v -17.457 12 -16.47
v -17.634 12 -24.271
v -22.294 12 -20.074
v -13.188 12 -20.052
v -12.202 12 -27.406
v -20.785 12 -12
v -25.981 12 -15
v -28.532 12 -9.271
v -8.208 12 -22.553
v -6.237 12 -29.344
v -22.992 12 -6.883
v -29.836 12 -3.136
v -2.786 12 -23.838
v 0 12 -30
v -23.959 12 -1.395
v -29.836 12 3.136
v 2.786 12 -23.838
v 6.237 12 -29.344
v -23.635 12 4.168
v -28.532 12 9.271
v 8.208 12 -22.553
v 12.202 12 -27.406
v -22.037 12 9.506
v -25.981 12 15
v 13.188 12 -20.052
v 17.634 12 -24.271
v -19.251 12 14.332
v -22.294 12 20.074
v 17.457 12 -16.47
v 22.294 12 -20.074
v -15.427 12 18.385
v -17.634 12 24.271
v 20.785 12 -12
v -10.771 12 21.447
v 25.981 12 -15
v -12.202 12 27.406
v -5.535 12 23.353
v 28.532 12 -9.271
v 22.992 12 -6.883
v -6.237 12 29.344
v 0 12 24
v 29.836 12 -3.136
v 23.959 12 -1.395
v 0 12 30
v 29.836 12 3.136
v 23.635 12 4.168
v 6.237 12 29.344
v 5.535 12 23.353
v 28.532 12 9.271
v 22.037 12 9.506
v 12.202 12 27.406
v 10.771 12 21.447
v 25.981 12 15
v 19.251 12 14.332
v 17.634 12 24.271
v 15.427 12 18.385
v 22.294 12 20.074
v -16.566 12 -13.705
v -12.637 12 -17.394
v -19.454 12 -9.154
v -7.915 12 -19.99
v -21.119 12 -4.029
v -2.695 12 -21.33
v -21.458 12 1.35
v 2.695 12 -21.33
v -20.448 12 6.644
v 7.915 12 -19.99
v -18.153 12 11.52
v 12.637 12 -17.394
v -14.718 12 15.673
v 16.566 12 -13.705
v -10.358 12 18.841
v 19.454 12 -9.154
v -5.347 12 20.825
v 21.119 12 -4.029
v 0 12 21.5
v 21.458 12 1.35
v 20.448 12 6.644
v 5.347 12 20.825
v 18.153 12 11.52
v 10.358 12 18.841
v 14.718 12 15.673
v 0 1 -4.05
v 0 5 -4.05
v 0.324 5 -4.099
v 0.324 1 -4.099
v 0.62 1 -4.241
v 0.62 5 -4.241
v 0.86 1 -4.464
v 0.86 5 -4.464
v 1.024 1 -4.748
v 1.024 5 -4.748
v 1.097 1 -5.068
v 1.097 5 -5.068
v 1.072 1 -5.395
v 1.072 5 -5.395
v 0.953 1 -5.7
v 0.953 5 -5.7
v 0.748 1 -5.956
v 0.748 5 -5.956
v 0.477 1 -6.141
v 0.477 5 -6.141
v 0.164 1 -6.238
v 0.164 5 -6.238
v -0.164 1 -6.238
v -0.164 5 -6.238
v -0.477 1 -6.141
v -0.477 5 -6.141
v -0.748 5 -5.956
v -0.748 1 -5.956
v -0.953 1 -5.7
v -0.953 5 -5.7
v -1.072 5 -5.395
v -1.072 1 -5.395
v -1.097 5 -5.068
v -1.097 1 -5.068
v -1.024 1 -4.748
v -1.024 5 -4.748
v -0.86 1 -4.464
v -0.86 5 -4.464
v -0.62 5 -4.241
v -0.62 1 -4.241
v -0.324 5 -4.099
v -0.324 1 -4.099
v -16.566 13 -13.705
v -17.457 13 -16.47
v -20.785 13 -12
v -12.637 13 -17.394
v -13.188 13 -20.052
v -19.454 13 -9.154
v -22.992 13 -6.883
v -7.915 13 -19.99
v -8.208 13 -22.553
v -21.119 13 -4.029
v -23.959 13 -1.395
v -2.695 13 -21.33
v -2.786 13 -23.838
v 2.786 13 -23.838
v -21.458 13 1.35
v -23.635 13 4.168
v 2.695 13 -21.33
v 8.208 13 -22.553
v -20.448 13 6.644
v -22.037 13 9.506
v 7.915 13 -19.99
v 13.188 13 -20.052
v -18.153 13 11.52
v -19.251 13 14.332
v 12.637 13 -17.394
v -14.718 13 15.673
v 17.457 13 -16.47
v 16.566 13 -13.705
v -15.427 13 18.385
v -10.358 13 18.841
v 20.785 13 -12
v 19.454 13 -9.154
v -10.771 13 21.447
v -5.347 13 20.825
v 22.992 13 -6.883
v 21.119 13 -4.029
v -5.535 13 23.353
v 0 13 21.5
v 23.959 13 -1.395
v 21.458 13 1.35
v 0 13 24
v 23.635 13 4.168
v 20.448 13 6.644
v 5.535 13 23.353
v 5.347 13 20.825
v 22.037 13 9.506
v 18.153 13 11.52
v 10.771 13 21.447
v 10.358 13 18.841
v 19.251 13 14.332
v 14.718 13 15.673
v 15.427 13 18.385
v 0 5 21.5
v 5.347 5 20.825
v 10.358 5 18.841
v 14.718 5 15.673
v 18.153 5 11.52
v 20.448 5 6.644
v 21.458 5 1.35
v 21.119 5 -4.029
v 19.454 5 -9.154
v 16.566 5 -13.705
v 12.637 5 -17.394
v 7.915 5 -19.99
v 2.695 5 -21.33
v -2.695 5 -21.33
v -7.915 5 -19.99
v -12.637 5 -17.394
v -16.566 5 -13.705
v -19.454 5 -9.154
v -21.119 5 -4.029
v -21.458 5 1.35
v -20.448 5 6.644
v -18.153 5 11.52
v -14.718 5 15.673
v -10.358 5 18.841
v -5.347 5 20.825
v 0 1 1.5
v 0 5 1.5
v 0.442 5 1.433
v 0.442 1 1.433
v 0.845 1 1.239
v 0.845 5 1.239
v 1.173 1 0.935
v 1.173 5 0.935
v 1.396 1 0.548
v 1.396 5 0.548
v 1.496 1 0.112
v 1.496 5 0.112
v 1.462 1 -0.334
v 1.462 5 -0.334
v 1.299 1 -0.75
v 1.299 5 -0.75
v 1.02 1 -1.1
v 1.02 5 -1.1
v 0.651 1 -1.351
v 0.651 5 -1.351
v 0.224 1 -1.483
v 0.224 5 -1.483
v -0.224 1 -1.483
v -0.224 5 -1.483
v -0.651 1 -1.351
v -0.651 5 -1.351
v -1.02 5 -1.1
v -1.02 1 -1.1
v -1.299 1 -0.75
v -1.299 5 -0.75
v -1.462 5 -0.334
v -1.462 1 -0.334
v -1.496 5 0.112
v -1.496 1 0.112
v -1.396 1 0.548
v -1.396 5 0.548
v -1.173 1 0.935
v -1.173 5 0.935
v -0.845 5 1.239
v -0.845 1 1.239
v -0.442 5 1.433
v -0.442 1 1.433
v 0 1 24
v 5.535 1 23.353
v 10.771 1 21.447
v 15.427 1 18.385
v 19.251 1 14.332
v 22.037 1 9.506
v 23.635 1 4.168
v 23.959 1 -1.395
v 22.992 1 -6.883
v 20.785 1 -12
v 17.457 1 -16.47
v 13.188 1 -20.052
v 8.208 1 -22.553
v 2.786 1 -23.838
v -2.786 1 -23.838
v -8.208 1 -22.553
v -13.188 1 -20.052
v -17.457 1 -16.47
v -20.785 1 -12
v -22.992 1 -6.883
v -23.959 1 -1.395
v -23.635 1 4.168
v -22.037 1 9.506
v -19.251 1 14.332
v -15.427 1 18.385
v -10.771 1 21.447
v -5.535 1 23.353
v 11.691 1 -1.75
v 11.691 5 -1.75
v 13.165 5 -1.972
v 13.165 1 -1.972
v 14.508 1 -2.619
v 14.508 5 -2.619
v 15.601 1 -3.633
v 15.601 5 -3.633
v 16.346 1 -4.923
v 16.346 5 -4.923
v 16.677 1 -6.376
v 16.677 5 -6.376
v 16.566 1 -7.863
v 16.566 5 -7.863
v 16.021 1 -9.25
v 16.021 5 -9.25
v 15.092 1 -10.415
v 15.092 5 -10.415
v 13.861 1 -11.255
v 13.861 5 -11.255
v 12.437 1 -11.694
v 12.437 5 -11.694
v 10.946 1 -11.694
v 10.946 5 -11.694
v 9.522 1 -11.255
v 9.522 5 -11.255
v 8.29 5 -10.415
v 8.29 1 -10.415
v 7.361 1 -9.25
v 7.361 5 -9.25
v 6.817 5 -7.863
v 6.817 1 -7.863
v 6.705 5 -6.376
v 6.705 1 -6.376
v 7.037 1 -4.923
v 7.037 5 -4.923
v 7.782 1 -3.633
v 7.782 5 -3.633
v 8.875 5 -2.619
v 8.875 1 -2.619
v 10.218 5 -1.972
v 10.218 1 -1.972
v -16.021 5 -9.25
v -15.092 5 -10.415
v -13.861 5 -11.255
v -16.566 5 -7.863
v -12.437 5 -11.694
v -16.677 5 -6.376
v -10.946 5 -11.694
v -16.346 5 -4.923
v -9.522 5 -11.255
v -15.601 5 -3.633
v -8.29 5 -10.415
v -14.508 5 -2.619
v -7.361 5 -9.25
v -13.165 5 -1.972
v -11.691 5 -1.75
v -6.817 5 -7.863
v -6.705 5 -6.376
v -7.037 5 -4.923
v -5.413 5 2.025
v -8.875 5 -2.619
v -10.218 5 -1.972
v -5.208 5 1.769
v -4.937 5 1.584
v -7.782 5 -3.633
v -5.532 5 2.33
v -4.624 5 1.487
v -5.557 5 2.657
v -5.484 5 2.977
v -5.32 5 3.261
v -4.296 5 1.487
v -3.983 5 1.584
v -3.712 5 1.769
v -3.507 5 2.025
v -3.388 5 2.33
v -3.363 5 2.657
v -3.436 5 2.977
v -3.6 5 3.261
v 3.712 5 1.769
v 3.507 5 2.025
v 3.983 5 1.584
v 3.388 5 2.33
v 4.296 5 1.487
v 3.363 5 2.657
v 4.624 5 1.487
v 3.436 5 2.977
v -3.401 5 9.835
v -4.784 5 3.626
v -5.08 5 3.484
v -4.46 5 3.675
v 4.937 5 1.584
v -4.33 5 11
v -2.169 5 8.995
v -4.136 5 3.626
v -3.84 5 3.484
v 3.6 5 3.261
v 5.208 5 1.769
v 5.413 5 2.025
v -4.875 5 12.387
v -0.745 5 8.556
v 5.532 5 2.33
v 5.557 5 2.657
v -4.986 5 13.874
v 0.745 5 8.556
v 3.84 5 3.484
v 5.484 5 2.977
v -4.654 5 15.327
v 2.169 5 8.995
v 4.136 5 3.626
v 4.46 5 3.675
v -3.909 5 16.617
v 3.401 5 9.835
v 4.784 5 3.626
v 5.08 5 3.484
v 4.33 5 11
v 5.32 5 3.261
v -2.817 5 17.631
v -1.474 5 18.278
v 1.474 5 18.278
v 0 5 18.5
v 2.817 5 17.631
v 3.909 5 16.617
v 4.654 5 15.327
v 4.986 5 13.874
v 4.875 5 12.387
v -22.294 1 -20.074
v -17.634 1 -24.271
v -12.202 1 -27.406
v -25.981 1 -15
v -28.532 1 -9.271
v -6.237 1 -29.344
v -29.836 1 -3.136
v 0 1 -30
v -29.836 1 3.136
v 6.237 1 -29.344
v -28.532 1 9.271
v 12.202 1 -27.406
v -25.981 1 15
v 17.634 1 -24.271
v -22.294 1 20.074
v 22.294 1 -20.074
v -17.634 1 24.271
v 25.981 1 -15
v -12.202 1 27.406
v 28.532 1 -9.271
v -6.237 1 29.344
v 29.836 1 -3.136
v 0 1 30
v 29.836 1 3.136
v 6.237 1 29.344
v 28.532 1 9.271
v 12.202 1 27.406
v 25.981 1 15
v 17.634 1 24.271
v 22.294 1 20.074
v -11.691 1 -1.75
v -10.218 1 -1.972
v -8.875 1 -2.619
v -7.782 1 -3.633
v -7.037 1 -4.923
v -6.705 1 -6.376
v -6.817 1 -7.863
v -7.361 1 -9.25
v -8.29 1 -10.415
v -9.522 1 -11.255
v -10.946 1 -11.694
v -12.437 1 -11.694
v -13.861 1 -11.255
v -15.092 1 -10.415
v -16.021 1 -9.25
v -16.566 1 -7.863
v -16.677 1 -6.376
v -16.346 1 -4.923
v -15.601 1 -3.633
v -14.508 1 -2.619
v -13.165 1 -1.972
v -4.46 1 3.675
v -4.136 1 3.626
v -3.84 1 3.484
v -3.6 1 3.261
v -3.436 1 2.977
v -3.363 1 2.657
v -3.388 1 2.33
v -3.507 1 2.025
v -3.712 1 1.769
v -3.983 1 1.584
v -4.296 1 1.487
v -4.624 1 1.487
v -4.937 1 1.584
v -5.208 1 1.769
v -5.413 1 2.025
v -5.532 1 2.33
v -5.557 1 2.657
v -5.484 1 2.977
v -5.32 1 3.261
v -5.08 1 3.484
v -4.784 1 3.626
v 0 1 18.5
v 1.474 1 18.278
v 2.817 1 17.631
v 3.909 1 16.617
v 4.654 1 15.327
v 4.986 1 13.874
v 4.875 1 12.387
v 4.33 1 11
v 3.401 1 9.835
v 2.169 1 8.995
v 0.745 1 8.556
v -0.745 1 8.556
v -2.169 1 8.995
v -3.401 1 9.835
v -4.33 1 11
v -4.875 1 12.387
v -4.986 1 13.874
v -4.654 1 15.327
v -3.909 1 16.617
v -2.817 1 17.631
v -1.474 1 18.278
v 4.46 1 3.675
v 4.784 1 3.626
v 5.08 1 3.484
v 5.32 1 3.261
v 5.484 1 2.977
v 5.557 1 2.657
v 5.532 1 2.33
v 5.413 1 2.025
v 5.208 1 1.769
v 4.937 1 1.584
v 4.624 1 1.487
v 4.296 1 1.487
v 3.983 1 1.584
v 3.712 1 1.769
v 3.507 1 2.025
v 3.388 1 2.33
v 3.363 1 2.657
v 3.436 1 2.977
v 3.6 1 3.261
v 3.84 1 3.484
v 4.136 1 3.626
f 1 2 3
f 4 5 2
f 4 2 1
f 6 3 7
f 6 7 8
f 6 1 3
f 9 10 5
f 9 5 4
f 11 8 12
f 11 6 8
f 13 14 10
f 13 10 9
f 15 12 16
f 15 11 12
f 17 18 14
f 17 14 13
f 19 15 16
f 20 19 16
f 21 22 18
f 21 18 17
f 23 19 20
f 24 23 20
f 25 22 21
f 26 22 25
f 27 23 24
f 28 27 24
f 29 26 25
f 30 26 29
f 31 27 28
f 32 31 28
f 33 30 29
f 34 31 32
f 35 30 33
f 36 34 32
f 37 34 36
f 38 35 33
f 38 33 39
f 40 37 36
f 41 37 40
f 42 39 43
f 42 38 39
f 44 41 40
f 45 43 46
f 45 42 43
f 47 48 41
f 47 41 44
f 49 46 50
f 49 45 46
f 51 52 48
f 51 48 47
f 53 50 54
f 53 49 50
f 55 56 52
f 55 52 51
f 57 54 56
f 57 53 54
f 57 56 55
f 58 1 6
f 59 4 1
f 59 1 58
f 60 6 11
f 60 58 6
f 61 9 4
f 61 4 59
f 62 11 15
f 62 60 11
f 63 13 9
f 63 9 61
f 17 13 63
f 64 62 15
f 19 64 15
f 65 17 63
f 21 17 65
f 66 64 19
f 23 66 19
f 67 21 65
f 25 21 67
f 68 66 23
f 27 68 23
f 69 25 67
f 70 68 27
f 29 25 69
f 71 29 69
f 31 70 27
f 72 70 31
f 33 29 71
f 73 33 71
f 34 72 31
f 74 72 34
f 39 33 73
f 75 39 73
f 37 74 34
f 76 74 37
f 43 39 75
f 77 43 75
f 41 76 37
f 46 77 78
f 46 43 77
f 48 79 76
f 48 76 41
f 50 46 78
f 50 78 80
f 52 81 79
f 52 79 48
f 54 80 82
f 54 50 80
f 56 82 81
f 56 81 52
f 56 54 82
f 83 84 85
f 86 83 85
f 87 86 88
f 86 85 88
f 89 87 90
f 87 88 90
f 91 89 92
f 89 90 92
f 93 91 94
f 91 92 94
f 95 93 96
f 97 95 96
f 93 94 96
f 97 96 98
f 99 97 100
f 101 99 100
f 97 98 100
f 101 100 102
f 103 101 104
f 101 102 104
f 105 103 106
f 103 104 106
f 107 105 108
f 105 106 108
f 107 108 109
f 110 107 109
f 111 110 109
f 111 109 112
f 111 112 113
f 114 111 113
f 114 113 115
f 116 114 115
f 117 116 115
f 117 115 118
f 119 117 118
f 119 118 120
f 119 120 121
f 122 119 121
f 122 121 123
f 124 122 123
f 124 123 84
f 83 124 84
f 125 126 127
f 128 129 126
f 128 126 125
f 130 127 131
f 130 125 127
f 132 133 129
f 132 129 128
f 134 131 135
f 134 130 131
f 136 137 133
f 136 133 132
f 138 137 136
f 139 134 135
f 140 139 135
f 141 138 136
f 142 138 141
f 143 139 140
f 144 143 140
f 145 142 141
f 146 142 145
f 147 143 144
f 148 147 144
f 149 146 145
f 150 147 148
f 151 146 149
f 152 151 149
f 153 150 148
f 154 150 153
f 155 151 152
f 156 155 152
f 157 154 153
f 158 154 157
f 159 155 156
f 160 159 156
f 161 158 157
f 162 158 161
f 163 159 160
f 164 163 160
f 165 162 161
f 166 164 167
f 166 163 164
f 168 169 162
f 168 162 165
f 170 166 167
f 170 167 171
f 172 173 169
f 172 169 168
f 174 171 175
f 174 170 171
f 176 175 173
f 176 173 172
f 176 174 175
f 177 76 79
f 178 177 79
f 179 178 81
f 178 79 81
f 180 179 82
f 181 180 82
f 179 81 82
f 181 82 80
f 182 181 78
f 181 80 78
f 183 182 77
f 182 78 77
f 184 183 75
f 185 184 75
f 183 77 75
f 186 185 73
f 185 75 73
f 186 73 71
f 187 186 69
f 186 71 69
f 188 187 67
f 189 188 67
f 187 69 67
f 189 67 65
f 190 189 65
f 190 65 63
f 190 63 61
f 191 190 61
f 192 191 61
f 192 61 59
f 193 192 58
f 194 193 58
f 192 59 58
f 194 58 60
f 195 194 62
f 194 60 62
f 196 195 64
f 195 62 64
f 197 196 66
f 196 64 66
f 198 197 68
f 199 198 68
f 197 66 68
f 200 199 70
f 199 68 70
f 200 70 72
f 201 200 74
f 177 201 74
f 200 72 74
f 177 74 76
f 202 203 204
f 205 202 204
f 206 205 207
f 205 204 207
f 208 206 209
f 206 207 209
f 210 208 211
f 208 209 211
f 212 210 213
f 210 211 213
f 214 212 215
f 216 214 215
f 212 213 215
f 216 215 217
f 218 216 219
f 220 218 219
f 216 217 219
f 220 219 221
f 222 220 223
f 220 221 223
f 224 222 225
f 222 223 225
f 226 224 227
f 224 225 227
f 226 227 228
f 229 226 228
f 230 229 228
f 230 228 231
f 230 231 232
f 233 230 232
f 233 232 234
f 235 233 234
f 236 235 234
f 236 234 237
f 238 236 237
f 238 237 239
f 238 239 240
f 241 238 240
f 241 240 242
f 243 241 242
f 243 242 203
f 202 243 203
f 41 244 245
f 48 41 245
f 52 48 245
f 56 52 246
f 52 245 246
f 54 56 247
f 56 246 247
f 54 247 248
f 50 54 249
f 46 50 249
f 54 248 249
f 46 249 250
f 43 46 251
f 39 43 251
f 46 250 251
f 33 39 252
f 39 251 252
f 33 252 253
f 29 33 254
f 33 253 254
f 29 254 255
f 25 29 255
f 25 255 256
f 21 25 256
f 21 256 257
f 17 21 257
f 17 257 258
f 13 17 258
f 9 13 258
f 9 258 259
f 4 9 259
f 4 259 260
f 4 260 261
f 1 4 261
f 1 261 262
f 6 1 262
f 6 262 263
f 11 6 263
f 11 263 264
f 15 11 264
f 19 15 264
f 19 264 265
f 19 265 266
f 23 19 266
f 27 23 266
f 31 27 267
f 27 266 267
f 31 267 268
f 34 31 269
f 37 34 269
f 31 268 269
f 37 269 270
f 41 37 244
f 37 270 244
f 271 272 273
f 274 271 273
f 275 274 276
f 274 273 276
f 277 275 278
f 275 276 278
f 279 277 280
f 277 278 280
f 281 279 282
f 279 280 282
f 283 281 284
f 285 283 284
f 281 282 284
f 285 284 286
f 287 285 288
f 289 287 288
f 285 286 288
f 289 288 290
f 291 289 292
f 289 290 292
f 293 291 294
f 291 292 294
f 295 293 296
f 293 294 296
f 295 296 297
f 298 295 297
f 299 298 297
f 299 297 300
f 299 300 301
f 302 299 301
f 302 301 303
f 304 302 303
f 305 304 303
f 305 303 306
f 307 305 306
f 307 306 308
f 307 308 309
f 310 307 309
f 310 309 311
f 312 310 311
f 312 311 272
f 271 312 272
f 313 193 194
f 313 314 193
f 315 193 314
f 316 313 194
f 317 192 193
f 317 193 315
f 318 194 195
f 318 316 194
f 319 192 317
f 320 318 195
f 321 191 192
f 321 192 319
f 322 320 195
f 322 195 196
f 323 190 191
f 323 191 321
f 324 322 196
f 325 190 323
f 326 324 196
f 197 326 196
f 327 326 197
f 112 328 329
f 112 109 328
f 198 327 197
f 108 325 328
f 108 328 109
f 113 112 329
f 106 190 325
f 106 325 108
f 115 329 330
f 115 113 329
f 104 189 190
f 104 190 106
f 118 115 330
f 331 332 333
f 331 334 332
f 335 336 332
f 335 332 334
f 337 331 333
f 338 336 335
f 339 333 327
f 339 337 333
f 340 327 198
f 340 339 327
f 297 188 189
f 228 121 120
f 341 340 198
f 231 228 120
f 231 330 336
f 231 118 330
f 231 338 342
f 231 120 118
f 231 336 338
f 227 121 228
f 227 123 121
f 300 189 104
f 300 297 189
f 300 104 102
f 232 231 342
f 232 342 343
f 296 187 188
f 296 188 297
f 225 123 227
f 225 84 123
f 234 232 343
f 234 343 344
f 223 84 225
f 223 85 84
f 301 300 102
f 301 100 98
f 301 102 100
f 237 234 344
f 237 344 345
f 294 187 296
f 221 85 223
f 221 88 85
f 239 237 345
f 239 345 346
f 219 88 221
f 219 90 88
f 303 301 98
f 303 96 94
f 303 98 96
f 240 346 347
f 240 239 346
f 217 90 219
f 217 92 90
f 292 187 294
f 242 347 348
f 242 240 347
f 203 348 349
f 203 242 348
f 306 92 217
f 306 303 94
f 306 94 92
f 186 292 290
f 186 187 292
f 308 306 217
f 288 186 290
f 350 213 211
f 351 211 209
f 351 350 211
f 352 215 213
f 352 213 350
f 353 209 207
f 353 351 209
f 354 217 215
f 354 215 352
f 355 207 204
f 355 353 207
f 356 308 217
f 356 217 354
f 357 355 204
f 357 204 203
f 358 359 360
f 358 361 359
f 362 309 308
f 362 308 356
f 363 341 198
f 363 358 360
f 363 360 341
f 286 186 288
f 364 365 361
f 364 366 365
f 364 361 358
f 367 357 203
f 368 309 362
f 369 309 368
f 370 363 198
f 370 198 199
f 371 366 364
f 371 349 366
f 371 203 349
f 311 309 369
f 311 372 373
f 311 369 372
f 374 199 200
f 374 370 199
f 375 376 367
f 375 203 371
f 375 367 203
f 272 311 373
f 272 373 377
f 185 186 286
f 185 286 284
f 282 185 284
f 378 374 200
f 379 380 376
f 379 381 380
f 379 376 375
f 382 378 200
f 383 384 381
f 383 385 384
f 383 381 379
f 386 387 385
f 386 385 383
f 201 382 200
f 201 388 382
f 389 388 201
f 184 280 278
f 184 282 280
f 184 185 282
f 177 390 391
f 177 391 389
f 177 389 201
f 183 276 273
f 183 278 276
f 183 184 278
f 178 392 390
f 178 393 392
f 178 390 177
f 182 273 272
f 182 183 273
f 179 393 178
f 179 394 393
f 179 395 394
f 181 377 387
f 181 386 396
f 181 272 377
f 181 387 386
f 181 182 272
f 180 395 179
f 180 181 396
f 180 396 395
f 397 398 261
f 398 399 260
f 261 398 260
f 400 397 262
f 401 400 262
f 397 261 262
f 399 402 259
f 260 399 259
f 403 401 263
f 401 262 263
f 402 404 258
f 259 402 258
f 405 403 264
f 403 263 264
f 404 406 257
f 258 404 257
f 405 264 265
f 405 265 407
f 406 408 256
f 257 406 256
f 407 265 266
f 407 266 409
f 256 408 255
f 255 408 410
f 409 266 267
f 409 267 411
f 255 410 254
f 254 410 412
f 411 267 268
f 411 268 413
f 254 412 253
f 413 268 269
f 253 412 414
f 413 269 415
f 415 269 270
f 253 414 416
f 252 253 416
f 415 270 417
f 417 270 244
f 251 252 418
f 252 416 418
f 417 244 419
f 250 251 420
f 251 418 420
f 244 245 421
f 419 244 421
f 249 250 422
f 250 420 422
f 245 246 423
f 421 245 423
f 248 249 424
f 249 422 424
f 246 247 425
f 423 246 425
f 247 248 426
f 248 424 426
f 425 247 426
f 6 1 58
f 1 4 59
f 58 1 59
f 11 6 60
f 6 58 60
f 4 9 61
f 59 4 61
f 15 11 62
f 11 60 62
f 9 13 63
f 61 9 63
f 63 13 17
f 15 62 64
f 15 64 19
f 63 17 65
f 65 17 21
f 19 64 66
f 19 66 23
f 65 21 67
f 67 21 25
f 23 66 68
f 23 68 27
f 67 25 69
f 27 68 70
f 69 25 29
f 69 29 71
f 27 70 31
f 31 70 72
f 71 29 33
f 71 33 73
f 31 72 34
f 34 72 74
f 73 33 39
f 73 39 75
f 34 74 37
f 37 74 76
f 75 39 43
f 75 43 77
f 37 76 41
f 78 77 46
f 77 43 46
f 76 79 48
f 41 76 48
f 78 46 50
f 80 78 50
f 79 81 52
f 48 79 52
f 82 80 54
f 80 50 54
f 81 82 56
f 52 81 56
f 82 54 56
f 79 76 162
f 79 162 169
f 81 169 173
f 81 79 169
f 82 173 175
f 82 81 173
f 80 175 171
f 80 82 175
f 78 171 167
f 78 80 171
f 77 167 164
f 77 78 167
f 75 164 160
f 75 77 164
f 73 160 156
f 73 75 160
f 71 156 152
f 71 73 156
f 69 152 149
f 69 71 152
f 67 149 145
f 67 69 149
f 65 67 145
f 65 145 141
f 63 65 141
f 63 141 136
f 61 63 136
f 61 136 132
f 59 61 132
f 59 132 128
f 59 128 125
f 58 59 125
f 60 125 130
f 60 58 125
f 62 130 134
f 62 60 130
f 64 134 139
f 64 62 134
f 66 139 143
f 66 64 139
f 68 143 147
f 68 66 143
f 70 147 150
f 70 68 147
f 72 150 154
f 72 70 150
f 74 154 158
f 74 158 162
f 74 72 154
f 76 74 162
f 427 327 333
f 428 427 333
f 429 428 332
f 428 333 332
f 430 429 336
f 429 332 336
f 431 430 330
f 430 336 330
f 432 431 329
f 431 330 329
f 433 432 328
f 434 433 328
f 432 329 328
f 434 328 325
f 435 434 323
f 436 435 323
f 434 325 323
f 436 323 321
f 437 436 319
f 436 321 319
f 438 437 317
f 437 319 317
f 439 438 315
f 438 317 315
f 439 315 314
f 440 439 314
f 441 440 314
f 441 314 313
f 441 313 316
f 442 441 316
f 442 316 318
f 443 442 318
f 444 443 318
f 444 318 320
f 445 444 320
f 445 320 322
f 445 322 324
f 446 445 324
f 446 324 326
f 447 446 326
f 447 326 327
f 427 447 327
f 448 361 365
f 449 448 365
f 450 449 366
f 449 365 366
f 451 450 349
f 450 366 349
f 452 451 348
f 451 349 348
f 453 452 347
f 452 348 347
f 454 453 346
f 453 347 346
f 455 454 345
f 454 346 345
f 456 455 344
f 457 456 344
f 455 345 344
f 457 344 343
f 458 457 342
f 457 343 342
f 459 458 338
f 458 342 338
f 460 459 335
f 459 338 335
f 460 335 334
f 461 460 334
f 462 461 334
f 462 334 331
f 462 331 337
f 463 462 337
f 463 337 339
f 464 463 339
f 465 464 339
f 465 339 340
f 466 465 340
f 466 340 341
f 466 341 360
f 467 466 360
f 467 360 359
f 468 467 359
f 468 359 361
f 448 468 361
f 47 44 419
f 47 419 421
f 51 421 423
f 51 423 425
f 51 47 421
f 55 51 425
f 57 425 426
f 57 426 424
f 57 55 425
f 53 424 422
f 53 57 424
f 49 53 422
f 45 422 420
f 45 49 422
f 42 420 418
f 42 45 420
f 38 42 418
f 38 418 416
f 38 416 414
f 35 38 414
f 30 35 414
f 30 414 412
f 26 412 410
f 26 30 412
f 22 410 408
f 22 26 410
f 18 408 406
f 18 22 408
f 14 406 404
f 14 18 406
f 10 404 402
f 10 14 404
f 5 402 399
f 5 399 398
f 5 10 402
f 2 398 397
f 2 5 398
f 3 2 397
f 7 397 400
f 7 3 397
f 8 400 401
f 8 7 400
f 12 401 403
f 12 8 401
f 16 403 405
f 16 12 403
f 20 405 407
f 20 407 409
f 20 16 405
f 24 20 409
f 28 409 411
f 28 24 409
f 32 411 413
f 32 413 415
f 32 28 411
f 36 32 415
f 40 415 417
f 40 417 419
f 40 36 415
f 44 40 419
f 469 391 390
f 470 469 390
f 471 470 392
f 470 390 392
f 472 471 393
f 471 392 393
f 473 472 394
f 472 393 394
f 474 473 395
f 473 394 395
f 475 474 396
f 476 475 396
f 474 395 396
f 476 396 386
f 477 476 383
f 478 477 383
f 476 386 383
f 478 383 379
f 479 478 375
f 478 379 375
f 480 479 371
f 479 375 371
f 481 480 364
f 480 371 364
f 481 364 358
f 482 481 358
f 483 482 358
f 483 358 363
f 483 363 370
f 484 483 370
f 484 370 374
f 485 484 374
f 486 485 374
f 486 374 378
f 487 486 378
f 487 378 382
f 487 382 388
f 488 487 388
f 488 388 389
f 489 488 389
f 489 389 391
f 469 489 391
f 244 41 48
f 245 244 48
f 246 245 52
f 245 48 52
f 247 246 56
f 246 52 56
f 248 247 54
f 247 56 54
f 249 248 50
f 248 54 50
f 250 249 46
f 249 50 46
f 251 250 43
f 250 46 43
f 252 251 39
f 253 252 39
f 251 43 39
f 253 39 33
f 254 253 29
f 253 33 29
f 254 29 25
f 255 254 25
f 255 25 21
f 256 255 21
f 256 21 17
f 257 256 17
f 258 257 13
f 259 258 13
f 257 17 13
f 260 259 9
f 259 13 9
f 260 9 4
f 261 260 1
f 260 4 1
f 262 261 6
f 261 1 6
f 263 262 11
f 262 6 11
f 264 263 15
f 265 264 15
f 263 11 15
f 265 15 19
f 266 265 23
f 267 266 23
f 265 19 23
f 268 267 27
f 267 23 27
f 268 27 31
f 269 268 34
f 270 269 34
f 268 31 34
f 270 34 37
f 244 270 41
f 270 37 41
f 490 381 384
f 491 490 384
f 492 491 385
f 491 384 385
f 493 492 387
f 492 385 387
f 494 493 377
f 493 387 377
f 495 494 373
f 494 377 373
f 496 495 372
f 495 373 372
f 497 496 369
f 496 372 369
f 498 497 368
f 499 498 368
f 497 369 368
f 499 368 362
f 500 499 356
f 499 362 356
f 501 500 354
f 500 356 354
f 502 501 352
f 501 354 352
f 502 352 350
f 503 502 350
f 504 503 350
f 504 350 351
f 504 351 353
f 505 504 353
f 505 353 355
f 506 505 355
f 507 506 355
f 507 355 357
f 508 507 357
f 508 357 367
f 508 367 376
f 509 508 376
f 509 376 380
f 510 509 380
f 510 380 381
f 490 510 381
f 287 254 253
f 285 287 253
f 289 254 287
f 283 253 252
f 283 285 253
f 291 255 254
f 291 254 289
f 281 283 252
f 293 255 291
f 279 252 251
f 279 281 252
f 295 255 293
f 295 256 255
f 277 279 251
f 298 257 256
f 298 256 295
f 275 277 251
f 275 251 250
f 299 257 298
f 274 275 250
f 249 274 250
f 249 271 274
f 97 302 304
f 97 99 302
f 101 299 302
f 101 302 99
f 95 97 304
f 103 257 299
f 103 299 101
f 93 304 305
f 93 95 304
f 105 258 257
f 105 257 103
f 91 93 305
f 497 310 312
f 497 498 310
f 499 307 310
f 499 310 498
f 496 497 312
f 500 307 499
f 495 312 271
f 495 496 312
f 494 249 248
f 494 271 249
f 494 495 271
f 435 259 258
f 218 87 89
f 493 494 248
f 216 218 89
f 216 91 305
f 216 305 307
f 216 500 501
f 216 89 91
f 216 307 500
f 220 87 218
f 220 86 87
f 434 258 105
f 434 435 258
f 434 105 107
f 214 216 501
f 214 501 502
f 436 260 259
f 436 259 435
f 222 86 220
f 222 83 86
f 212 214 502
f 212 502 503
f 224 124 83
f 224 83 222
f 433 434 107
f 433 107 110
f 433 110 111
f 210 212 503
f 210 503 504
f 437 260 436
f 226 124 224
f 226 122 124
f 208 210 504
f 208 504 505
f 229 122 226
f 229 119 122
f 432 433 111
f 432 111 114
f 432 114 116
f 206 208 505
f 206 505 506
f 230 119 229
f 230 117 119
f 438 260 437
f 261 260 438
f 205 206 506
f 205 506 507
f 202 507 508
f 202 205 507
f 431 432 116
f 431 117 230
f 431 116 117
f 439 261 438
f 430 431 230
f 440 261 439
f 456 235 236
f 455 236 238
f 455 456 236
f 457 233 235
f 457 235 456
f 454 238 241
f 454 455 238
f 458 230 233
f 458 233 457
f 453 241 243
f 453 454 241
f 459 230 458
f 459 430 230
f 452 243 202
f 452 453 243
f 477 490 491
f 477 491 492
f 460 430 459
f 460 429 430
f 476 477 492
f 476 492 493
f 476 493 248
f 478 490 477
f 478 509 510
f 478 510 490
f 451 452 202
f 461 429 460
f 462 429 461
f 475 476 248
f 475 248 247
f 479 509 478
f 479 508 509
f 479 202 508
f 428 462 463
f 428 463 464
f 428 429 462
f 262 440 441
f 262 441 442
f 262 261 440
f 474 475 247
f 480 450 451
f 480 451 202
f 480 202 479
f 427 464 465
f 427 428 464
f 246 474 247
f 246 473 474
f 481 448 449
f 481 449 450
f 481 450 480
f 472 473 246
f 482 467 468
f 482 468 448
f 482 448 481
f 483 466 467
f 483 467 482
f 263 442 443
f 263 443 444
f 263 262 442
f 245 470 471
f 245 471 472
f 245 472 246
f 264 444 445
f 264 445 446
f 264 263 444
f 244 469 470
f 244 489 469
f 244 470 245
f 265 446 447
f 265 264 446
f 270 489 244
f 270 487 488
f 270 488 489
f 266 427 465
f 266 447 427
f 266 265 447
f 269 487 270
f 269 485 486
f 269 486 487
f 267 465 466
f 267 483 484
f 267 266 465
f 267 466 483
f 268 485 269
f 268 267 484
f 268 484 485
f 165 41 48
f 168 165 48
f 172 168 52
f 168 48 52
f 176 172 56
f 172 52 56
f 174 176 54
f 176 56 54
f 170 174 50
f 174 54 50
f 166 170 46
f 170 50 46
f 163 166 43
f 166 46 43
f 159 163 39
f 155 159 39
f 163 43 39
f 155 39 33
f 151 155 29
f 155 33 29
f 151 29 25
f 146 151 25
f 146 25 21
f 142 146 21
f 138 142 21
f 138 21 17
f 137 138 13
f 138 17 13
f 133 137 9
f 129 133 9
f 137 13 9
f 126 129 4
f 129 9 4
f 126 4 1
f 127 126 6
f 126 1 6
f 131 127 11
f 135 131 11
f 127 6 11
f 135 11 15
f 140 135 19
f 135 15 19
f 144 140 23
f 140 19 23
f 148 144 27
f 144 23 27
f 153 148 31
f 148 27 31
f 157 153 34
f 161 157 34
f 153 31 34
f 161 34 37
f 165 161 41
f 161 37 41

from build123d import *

# Parameters (mm, degrees)
SKETCH_1_R          = 24
EXTRUDE_1_DEPTH     = 12
SKETCH_2_R          = 21.5
CUT_EXTRUDE_3_DEPTH = 7
SKETCH_3_R          = 1.1
SKETCH_3_R_2        = 1.5
CUT_EXTRUDE_4_DEPTH = 35.655446902
SKETCH_5_R          = 30
SKETCH_5_R_2        = 24
EXTRUDE_2_DEPTH     = 11
SKETCH_7_R          = 24
CUT_EXTRUDE_6_DEPTH = 1
SKETCH_8_R          = 24
SKETCH_8_R_2        = 21.5
EXTRUDE_4_DEPTH     = 1
SKETCH_4_R          = 5
CUT_EXTRUDE_8_DEPTH = 44.17406629


with BuildPart() as part:
    # 草图1 → 凸台-拉伸1 (new body)
    with BuildSketch(Plane(origin=(0, 0, 0), x_dir=(1, 0, 0), z_dir=(0, 1, 0))):
        with Locations(Location((0, 0, 0), (0, 0, 270))):
            Circle(SKETCH_1_R)
    extrude(amount=EXTRUDE_1_DEPTH)

    # 草图2 → 切除-拉伸3 (cut)
    with BuildSketch(Plane(origin=(0, 12, 0), x_dir=(1, 0, 0), z_dir=(0, 1, 0))):
        with Locations(Location((0, 0, 0), (0, 0, 270))):
            Circle(SKETCH_2_R)
    extrude(amount=-CUT_EXTRUDE_3_DEPTH, mode=Mode.SUBTRACT)

    # 草图3 → 切除-拉伸4 (cut, through all)
    with BuildSketch(Plane(origin=(0, 5, 0), x_dir=(1, 0, 0), z_dir=(0, 1, 0))):
        with Locations(Location((0, 5.15, 0), (0, 0, 270))):
            Circle(SKETCH_3_R)
        with Locations(Location((4.460030829, -2.575, 0), (0, 0, 270))):
            Circle(SKETCH_3_R)
        with Locations(Location((-4.460030829, -2.575, 0), (0, 0, 270))):
            Circle(SKETCH_3_R)
        with Locations(Location((0, 0, 0), (0, 0, 270))):
            Circle(SKETCH_3_R_2)
    extrude(amount=-CUT_EXTRUDE_4_DEPTH, mode=Mode.SUBTRACT)

    # 草图7 → 切除-拉伸6 (cut)
    with BuildSketch(Plane.XZ):
        with Locations(Location((0, 0, 0), (0, 0, 90))):
            Circle(SKETCH_7_R)
    extrude(amount=-CUT_EXTRUDE_6_DEPTH, mode=Mode.SUBTRACT)

    # 草图4 → 切除-拉伸8 (cut, through all)
    with BuildSketch(Plane(origin=(0, 5, 0), x_dir=(1, 0, 0), z_dir=(0, 1, 0))):
        with Locations(Location((-11.691342951, 6.75, 0), (0, 0, 270))):
            Circle(SKETCH_4_R)
        with Locations(Location((11.691342951, 6.75, 0), (0, 0, 270))):
            Circle(SKETCH_4_R)
        with Locations(Location((0, -13.5, 0), (0, 0, 270))):
            Circle(SKETCH_4_R)
    extrude(amount=-CUT_EXTRUDE_8_DEPTH, mode=Mode.SUBTRACT)


with BuildPart() as body_2:
    # 草图5 → 凸台-拉伸2 (new body)
    with BuildSketch(Plane(origin=(0, 12, 0), x_dir=(1, 0, 0), z_dir=(0, 1, 0))):
        with Locations(Location((0, 0, 0), (0, 0, 270))):
            Circle(SKETCH_5_R)
        with Locations(Location((0, 0, 0), (0, 0, 270))):
            Circle(SKETCH_5_R_2, mode=Mode.SUBTRACT)
    extrude(amount=-EXTRUDE_2_DEPTH)


with BuildPart() as body_3:
    # 草图8 → 凸台-拉伸4 (new body)
    with BuildSketch(Plane(origin=(0, 12, 0), x_dir=(1, 0, 0), z_dir=(0, 1, 0))):
        with Locations(Location((0, 0, 0), (0, 0, 270))):
            Circle(SKETCH_8_R)
        with Locations(Location((0, 0, 0), (0, 0, 270))):
            Circle(SKETCH_8_R_2, mode=Mode.SUBTRACT)
    extrude(amount=EXTRUDE_4_DEPTH)


solid = Compound([part.part, body_2.part, body_3.part])
